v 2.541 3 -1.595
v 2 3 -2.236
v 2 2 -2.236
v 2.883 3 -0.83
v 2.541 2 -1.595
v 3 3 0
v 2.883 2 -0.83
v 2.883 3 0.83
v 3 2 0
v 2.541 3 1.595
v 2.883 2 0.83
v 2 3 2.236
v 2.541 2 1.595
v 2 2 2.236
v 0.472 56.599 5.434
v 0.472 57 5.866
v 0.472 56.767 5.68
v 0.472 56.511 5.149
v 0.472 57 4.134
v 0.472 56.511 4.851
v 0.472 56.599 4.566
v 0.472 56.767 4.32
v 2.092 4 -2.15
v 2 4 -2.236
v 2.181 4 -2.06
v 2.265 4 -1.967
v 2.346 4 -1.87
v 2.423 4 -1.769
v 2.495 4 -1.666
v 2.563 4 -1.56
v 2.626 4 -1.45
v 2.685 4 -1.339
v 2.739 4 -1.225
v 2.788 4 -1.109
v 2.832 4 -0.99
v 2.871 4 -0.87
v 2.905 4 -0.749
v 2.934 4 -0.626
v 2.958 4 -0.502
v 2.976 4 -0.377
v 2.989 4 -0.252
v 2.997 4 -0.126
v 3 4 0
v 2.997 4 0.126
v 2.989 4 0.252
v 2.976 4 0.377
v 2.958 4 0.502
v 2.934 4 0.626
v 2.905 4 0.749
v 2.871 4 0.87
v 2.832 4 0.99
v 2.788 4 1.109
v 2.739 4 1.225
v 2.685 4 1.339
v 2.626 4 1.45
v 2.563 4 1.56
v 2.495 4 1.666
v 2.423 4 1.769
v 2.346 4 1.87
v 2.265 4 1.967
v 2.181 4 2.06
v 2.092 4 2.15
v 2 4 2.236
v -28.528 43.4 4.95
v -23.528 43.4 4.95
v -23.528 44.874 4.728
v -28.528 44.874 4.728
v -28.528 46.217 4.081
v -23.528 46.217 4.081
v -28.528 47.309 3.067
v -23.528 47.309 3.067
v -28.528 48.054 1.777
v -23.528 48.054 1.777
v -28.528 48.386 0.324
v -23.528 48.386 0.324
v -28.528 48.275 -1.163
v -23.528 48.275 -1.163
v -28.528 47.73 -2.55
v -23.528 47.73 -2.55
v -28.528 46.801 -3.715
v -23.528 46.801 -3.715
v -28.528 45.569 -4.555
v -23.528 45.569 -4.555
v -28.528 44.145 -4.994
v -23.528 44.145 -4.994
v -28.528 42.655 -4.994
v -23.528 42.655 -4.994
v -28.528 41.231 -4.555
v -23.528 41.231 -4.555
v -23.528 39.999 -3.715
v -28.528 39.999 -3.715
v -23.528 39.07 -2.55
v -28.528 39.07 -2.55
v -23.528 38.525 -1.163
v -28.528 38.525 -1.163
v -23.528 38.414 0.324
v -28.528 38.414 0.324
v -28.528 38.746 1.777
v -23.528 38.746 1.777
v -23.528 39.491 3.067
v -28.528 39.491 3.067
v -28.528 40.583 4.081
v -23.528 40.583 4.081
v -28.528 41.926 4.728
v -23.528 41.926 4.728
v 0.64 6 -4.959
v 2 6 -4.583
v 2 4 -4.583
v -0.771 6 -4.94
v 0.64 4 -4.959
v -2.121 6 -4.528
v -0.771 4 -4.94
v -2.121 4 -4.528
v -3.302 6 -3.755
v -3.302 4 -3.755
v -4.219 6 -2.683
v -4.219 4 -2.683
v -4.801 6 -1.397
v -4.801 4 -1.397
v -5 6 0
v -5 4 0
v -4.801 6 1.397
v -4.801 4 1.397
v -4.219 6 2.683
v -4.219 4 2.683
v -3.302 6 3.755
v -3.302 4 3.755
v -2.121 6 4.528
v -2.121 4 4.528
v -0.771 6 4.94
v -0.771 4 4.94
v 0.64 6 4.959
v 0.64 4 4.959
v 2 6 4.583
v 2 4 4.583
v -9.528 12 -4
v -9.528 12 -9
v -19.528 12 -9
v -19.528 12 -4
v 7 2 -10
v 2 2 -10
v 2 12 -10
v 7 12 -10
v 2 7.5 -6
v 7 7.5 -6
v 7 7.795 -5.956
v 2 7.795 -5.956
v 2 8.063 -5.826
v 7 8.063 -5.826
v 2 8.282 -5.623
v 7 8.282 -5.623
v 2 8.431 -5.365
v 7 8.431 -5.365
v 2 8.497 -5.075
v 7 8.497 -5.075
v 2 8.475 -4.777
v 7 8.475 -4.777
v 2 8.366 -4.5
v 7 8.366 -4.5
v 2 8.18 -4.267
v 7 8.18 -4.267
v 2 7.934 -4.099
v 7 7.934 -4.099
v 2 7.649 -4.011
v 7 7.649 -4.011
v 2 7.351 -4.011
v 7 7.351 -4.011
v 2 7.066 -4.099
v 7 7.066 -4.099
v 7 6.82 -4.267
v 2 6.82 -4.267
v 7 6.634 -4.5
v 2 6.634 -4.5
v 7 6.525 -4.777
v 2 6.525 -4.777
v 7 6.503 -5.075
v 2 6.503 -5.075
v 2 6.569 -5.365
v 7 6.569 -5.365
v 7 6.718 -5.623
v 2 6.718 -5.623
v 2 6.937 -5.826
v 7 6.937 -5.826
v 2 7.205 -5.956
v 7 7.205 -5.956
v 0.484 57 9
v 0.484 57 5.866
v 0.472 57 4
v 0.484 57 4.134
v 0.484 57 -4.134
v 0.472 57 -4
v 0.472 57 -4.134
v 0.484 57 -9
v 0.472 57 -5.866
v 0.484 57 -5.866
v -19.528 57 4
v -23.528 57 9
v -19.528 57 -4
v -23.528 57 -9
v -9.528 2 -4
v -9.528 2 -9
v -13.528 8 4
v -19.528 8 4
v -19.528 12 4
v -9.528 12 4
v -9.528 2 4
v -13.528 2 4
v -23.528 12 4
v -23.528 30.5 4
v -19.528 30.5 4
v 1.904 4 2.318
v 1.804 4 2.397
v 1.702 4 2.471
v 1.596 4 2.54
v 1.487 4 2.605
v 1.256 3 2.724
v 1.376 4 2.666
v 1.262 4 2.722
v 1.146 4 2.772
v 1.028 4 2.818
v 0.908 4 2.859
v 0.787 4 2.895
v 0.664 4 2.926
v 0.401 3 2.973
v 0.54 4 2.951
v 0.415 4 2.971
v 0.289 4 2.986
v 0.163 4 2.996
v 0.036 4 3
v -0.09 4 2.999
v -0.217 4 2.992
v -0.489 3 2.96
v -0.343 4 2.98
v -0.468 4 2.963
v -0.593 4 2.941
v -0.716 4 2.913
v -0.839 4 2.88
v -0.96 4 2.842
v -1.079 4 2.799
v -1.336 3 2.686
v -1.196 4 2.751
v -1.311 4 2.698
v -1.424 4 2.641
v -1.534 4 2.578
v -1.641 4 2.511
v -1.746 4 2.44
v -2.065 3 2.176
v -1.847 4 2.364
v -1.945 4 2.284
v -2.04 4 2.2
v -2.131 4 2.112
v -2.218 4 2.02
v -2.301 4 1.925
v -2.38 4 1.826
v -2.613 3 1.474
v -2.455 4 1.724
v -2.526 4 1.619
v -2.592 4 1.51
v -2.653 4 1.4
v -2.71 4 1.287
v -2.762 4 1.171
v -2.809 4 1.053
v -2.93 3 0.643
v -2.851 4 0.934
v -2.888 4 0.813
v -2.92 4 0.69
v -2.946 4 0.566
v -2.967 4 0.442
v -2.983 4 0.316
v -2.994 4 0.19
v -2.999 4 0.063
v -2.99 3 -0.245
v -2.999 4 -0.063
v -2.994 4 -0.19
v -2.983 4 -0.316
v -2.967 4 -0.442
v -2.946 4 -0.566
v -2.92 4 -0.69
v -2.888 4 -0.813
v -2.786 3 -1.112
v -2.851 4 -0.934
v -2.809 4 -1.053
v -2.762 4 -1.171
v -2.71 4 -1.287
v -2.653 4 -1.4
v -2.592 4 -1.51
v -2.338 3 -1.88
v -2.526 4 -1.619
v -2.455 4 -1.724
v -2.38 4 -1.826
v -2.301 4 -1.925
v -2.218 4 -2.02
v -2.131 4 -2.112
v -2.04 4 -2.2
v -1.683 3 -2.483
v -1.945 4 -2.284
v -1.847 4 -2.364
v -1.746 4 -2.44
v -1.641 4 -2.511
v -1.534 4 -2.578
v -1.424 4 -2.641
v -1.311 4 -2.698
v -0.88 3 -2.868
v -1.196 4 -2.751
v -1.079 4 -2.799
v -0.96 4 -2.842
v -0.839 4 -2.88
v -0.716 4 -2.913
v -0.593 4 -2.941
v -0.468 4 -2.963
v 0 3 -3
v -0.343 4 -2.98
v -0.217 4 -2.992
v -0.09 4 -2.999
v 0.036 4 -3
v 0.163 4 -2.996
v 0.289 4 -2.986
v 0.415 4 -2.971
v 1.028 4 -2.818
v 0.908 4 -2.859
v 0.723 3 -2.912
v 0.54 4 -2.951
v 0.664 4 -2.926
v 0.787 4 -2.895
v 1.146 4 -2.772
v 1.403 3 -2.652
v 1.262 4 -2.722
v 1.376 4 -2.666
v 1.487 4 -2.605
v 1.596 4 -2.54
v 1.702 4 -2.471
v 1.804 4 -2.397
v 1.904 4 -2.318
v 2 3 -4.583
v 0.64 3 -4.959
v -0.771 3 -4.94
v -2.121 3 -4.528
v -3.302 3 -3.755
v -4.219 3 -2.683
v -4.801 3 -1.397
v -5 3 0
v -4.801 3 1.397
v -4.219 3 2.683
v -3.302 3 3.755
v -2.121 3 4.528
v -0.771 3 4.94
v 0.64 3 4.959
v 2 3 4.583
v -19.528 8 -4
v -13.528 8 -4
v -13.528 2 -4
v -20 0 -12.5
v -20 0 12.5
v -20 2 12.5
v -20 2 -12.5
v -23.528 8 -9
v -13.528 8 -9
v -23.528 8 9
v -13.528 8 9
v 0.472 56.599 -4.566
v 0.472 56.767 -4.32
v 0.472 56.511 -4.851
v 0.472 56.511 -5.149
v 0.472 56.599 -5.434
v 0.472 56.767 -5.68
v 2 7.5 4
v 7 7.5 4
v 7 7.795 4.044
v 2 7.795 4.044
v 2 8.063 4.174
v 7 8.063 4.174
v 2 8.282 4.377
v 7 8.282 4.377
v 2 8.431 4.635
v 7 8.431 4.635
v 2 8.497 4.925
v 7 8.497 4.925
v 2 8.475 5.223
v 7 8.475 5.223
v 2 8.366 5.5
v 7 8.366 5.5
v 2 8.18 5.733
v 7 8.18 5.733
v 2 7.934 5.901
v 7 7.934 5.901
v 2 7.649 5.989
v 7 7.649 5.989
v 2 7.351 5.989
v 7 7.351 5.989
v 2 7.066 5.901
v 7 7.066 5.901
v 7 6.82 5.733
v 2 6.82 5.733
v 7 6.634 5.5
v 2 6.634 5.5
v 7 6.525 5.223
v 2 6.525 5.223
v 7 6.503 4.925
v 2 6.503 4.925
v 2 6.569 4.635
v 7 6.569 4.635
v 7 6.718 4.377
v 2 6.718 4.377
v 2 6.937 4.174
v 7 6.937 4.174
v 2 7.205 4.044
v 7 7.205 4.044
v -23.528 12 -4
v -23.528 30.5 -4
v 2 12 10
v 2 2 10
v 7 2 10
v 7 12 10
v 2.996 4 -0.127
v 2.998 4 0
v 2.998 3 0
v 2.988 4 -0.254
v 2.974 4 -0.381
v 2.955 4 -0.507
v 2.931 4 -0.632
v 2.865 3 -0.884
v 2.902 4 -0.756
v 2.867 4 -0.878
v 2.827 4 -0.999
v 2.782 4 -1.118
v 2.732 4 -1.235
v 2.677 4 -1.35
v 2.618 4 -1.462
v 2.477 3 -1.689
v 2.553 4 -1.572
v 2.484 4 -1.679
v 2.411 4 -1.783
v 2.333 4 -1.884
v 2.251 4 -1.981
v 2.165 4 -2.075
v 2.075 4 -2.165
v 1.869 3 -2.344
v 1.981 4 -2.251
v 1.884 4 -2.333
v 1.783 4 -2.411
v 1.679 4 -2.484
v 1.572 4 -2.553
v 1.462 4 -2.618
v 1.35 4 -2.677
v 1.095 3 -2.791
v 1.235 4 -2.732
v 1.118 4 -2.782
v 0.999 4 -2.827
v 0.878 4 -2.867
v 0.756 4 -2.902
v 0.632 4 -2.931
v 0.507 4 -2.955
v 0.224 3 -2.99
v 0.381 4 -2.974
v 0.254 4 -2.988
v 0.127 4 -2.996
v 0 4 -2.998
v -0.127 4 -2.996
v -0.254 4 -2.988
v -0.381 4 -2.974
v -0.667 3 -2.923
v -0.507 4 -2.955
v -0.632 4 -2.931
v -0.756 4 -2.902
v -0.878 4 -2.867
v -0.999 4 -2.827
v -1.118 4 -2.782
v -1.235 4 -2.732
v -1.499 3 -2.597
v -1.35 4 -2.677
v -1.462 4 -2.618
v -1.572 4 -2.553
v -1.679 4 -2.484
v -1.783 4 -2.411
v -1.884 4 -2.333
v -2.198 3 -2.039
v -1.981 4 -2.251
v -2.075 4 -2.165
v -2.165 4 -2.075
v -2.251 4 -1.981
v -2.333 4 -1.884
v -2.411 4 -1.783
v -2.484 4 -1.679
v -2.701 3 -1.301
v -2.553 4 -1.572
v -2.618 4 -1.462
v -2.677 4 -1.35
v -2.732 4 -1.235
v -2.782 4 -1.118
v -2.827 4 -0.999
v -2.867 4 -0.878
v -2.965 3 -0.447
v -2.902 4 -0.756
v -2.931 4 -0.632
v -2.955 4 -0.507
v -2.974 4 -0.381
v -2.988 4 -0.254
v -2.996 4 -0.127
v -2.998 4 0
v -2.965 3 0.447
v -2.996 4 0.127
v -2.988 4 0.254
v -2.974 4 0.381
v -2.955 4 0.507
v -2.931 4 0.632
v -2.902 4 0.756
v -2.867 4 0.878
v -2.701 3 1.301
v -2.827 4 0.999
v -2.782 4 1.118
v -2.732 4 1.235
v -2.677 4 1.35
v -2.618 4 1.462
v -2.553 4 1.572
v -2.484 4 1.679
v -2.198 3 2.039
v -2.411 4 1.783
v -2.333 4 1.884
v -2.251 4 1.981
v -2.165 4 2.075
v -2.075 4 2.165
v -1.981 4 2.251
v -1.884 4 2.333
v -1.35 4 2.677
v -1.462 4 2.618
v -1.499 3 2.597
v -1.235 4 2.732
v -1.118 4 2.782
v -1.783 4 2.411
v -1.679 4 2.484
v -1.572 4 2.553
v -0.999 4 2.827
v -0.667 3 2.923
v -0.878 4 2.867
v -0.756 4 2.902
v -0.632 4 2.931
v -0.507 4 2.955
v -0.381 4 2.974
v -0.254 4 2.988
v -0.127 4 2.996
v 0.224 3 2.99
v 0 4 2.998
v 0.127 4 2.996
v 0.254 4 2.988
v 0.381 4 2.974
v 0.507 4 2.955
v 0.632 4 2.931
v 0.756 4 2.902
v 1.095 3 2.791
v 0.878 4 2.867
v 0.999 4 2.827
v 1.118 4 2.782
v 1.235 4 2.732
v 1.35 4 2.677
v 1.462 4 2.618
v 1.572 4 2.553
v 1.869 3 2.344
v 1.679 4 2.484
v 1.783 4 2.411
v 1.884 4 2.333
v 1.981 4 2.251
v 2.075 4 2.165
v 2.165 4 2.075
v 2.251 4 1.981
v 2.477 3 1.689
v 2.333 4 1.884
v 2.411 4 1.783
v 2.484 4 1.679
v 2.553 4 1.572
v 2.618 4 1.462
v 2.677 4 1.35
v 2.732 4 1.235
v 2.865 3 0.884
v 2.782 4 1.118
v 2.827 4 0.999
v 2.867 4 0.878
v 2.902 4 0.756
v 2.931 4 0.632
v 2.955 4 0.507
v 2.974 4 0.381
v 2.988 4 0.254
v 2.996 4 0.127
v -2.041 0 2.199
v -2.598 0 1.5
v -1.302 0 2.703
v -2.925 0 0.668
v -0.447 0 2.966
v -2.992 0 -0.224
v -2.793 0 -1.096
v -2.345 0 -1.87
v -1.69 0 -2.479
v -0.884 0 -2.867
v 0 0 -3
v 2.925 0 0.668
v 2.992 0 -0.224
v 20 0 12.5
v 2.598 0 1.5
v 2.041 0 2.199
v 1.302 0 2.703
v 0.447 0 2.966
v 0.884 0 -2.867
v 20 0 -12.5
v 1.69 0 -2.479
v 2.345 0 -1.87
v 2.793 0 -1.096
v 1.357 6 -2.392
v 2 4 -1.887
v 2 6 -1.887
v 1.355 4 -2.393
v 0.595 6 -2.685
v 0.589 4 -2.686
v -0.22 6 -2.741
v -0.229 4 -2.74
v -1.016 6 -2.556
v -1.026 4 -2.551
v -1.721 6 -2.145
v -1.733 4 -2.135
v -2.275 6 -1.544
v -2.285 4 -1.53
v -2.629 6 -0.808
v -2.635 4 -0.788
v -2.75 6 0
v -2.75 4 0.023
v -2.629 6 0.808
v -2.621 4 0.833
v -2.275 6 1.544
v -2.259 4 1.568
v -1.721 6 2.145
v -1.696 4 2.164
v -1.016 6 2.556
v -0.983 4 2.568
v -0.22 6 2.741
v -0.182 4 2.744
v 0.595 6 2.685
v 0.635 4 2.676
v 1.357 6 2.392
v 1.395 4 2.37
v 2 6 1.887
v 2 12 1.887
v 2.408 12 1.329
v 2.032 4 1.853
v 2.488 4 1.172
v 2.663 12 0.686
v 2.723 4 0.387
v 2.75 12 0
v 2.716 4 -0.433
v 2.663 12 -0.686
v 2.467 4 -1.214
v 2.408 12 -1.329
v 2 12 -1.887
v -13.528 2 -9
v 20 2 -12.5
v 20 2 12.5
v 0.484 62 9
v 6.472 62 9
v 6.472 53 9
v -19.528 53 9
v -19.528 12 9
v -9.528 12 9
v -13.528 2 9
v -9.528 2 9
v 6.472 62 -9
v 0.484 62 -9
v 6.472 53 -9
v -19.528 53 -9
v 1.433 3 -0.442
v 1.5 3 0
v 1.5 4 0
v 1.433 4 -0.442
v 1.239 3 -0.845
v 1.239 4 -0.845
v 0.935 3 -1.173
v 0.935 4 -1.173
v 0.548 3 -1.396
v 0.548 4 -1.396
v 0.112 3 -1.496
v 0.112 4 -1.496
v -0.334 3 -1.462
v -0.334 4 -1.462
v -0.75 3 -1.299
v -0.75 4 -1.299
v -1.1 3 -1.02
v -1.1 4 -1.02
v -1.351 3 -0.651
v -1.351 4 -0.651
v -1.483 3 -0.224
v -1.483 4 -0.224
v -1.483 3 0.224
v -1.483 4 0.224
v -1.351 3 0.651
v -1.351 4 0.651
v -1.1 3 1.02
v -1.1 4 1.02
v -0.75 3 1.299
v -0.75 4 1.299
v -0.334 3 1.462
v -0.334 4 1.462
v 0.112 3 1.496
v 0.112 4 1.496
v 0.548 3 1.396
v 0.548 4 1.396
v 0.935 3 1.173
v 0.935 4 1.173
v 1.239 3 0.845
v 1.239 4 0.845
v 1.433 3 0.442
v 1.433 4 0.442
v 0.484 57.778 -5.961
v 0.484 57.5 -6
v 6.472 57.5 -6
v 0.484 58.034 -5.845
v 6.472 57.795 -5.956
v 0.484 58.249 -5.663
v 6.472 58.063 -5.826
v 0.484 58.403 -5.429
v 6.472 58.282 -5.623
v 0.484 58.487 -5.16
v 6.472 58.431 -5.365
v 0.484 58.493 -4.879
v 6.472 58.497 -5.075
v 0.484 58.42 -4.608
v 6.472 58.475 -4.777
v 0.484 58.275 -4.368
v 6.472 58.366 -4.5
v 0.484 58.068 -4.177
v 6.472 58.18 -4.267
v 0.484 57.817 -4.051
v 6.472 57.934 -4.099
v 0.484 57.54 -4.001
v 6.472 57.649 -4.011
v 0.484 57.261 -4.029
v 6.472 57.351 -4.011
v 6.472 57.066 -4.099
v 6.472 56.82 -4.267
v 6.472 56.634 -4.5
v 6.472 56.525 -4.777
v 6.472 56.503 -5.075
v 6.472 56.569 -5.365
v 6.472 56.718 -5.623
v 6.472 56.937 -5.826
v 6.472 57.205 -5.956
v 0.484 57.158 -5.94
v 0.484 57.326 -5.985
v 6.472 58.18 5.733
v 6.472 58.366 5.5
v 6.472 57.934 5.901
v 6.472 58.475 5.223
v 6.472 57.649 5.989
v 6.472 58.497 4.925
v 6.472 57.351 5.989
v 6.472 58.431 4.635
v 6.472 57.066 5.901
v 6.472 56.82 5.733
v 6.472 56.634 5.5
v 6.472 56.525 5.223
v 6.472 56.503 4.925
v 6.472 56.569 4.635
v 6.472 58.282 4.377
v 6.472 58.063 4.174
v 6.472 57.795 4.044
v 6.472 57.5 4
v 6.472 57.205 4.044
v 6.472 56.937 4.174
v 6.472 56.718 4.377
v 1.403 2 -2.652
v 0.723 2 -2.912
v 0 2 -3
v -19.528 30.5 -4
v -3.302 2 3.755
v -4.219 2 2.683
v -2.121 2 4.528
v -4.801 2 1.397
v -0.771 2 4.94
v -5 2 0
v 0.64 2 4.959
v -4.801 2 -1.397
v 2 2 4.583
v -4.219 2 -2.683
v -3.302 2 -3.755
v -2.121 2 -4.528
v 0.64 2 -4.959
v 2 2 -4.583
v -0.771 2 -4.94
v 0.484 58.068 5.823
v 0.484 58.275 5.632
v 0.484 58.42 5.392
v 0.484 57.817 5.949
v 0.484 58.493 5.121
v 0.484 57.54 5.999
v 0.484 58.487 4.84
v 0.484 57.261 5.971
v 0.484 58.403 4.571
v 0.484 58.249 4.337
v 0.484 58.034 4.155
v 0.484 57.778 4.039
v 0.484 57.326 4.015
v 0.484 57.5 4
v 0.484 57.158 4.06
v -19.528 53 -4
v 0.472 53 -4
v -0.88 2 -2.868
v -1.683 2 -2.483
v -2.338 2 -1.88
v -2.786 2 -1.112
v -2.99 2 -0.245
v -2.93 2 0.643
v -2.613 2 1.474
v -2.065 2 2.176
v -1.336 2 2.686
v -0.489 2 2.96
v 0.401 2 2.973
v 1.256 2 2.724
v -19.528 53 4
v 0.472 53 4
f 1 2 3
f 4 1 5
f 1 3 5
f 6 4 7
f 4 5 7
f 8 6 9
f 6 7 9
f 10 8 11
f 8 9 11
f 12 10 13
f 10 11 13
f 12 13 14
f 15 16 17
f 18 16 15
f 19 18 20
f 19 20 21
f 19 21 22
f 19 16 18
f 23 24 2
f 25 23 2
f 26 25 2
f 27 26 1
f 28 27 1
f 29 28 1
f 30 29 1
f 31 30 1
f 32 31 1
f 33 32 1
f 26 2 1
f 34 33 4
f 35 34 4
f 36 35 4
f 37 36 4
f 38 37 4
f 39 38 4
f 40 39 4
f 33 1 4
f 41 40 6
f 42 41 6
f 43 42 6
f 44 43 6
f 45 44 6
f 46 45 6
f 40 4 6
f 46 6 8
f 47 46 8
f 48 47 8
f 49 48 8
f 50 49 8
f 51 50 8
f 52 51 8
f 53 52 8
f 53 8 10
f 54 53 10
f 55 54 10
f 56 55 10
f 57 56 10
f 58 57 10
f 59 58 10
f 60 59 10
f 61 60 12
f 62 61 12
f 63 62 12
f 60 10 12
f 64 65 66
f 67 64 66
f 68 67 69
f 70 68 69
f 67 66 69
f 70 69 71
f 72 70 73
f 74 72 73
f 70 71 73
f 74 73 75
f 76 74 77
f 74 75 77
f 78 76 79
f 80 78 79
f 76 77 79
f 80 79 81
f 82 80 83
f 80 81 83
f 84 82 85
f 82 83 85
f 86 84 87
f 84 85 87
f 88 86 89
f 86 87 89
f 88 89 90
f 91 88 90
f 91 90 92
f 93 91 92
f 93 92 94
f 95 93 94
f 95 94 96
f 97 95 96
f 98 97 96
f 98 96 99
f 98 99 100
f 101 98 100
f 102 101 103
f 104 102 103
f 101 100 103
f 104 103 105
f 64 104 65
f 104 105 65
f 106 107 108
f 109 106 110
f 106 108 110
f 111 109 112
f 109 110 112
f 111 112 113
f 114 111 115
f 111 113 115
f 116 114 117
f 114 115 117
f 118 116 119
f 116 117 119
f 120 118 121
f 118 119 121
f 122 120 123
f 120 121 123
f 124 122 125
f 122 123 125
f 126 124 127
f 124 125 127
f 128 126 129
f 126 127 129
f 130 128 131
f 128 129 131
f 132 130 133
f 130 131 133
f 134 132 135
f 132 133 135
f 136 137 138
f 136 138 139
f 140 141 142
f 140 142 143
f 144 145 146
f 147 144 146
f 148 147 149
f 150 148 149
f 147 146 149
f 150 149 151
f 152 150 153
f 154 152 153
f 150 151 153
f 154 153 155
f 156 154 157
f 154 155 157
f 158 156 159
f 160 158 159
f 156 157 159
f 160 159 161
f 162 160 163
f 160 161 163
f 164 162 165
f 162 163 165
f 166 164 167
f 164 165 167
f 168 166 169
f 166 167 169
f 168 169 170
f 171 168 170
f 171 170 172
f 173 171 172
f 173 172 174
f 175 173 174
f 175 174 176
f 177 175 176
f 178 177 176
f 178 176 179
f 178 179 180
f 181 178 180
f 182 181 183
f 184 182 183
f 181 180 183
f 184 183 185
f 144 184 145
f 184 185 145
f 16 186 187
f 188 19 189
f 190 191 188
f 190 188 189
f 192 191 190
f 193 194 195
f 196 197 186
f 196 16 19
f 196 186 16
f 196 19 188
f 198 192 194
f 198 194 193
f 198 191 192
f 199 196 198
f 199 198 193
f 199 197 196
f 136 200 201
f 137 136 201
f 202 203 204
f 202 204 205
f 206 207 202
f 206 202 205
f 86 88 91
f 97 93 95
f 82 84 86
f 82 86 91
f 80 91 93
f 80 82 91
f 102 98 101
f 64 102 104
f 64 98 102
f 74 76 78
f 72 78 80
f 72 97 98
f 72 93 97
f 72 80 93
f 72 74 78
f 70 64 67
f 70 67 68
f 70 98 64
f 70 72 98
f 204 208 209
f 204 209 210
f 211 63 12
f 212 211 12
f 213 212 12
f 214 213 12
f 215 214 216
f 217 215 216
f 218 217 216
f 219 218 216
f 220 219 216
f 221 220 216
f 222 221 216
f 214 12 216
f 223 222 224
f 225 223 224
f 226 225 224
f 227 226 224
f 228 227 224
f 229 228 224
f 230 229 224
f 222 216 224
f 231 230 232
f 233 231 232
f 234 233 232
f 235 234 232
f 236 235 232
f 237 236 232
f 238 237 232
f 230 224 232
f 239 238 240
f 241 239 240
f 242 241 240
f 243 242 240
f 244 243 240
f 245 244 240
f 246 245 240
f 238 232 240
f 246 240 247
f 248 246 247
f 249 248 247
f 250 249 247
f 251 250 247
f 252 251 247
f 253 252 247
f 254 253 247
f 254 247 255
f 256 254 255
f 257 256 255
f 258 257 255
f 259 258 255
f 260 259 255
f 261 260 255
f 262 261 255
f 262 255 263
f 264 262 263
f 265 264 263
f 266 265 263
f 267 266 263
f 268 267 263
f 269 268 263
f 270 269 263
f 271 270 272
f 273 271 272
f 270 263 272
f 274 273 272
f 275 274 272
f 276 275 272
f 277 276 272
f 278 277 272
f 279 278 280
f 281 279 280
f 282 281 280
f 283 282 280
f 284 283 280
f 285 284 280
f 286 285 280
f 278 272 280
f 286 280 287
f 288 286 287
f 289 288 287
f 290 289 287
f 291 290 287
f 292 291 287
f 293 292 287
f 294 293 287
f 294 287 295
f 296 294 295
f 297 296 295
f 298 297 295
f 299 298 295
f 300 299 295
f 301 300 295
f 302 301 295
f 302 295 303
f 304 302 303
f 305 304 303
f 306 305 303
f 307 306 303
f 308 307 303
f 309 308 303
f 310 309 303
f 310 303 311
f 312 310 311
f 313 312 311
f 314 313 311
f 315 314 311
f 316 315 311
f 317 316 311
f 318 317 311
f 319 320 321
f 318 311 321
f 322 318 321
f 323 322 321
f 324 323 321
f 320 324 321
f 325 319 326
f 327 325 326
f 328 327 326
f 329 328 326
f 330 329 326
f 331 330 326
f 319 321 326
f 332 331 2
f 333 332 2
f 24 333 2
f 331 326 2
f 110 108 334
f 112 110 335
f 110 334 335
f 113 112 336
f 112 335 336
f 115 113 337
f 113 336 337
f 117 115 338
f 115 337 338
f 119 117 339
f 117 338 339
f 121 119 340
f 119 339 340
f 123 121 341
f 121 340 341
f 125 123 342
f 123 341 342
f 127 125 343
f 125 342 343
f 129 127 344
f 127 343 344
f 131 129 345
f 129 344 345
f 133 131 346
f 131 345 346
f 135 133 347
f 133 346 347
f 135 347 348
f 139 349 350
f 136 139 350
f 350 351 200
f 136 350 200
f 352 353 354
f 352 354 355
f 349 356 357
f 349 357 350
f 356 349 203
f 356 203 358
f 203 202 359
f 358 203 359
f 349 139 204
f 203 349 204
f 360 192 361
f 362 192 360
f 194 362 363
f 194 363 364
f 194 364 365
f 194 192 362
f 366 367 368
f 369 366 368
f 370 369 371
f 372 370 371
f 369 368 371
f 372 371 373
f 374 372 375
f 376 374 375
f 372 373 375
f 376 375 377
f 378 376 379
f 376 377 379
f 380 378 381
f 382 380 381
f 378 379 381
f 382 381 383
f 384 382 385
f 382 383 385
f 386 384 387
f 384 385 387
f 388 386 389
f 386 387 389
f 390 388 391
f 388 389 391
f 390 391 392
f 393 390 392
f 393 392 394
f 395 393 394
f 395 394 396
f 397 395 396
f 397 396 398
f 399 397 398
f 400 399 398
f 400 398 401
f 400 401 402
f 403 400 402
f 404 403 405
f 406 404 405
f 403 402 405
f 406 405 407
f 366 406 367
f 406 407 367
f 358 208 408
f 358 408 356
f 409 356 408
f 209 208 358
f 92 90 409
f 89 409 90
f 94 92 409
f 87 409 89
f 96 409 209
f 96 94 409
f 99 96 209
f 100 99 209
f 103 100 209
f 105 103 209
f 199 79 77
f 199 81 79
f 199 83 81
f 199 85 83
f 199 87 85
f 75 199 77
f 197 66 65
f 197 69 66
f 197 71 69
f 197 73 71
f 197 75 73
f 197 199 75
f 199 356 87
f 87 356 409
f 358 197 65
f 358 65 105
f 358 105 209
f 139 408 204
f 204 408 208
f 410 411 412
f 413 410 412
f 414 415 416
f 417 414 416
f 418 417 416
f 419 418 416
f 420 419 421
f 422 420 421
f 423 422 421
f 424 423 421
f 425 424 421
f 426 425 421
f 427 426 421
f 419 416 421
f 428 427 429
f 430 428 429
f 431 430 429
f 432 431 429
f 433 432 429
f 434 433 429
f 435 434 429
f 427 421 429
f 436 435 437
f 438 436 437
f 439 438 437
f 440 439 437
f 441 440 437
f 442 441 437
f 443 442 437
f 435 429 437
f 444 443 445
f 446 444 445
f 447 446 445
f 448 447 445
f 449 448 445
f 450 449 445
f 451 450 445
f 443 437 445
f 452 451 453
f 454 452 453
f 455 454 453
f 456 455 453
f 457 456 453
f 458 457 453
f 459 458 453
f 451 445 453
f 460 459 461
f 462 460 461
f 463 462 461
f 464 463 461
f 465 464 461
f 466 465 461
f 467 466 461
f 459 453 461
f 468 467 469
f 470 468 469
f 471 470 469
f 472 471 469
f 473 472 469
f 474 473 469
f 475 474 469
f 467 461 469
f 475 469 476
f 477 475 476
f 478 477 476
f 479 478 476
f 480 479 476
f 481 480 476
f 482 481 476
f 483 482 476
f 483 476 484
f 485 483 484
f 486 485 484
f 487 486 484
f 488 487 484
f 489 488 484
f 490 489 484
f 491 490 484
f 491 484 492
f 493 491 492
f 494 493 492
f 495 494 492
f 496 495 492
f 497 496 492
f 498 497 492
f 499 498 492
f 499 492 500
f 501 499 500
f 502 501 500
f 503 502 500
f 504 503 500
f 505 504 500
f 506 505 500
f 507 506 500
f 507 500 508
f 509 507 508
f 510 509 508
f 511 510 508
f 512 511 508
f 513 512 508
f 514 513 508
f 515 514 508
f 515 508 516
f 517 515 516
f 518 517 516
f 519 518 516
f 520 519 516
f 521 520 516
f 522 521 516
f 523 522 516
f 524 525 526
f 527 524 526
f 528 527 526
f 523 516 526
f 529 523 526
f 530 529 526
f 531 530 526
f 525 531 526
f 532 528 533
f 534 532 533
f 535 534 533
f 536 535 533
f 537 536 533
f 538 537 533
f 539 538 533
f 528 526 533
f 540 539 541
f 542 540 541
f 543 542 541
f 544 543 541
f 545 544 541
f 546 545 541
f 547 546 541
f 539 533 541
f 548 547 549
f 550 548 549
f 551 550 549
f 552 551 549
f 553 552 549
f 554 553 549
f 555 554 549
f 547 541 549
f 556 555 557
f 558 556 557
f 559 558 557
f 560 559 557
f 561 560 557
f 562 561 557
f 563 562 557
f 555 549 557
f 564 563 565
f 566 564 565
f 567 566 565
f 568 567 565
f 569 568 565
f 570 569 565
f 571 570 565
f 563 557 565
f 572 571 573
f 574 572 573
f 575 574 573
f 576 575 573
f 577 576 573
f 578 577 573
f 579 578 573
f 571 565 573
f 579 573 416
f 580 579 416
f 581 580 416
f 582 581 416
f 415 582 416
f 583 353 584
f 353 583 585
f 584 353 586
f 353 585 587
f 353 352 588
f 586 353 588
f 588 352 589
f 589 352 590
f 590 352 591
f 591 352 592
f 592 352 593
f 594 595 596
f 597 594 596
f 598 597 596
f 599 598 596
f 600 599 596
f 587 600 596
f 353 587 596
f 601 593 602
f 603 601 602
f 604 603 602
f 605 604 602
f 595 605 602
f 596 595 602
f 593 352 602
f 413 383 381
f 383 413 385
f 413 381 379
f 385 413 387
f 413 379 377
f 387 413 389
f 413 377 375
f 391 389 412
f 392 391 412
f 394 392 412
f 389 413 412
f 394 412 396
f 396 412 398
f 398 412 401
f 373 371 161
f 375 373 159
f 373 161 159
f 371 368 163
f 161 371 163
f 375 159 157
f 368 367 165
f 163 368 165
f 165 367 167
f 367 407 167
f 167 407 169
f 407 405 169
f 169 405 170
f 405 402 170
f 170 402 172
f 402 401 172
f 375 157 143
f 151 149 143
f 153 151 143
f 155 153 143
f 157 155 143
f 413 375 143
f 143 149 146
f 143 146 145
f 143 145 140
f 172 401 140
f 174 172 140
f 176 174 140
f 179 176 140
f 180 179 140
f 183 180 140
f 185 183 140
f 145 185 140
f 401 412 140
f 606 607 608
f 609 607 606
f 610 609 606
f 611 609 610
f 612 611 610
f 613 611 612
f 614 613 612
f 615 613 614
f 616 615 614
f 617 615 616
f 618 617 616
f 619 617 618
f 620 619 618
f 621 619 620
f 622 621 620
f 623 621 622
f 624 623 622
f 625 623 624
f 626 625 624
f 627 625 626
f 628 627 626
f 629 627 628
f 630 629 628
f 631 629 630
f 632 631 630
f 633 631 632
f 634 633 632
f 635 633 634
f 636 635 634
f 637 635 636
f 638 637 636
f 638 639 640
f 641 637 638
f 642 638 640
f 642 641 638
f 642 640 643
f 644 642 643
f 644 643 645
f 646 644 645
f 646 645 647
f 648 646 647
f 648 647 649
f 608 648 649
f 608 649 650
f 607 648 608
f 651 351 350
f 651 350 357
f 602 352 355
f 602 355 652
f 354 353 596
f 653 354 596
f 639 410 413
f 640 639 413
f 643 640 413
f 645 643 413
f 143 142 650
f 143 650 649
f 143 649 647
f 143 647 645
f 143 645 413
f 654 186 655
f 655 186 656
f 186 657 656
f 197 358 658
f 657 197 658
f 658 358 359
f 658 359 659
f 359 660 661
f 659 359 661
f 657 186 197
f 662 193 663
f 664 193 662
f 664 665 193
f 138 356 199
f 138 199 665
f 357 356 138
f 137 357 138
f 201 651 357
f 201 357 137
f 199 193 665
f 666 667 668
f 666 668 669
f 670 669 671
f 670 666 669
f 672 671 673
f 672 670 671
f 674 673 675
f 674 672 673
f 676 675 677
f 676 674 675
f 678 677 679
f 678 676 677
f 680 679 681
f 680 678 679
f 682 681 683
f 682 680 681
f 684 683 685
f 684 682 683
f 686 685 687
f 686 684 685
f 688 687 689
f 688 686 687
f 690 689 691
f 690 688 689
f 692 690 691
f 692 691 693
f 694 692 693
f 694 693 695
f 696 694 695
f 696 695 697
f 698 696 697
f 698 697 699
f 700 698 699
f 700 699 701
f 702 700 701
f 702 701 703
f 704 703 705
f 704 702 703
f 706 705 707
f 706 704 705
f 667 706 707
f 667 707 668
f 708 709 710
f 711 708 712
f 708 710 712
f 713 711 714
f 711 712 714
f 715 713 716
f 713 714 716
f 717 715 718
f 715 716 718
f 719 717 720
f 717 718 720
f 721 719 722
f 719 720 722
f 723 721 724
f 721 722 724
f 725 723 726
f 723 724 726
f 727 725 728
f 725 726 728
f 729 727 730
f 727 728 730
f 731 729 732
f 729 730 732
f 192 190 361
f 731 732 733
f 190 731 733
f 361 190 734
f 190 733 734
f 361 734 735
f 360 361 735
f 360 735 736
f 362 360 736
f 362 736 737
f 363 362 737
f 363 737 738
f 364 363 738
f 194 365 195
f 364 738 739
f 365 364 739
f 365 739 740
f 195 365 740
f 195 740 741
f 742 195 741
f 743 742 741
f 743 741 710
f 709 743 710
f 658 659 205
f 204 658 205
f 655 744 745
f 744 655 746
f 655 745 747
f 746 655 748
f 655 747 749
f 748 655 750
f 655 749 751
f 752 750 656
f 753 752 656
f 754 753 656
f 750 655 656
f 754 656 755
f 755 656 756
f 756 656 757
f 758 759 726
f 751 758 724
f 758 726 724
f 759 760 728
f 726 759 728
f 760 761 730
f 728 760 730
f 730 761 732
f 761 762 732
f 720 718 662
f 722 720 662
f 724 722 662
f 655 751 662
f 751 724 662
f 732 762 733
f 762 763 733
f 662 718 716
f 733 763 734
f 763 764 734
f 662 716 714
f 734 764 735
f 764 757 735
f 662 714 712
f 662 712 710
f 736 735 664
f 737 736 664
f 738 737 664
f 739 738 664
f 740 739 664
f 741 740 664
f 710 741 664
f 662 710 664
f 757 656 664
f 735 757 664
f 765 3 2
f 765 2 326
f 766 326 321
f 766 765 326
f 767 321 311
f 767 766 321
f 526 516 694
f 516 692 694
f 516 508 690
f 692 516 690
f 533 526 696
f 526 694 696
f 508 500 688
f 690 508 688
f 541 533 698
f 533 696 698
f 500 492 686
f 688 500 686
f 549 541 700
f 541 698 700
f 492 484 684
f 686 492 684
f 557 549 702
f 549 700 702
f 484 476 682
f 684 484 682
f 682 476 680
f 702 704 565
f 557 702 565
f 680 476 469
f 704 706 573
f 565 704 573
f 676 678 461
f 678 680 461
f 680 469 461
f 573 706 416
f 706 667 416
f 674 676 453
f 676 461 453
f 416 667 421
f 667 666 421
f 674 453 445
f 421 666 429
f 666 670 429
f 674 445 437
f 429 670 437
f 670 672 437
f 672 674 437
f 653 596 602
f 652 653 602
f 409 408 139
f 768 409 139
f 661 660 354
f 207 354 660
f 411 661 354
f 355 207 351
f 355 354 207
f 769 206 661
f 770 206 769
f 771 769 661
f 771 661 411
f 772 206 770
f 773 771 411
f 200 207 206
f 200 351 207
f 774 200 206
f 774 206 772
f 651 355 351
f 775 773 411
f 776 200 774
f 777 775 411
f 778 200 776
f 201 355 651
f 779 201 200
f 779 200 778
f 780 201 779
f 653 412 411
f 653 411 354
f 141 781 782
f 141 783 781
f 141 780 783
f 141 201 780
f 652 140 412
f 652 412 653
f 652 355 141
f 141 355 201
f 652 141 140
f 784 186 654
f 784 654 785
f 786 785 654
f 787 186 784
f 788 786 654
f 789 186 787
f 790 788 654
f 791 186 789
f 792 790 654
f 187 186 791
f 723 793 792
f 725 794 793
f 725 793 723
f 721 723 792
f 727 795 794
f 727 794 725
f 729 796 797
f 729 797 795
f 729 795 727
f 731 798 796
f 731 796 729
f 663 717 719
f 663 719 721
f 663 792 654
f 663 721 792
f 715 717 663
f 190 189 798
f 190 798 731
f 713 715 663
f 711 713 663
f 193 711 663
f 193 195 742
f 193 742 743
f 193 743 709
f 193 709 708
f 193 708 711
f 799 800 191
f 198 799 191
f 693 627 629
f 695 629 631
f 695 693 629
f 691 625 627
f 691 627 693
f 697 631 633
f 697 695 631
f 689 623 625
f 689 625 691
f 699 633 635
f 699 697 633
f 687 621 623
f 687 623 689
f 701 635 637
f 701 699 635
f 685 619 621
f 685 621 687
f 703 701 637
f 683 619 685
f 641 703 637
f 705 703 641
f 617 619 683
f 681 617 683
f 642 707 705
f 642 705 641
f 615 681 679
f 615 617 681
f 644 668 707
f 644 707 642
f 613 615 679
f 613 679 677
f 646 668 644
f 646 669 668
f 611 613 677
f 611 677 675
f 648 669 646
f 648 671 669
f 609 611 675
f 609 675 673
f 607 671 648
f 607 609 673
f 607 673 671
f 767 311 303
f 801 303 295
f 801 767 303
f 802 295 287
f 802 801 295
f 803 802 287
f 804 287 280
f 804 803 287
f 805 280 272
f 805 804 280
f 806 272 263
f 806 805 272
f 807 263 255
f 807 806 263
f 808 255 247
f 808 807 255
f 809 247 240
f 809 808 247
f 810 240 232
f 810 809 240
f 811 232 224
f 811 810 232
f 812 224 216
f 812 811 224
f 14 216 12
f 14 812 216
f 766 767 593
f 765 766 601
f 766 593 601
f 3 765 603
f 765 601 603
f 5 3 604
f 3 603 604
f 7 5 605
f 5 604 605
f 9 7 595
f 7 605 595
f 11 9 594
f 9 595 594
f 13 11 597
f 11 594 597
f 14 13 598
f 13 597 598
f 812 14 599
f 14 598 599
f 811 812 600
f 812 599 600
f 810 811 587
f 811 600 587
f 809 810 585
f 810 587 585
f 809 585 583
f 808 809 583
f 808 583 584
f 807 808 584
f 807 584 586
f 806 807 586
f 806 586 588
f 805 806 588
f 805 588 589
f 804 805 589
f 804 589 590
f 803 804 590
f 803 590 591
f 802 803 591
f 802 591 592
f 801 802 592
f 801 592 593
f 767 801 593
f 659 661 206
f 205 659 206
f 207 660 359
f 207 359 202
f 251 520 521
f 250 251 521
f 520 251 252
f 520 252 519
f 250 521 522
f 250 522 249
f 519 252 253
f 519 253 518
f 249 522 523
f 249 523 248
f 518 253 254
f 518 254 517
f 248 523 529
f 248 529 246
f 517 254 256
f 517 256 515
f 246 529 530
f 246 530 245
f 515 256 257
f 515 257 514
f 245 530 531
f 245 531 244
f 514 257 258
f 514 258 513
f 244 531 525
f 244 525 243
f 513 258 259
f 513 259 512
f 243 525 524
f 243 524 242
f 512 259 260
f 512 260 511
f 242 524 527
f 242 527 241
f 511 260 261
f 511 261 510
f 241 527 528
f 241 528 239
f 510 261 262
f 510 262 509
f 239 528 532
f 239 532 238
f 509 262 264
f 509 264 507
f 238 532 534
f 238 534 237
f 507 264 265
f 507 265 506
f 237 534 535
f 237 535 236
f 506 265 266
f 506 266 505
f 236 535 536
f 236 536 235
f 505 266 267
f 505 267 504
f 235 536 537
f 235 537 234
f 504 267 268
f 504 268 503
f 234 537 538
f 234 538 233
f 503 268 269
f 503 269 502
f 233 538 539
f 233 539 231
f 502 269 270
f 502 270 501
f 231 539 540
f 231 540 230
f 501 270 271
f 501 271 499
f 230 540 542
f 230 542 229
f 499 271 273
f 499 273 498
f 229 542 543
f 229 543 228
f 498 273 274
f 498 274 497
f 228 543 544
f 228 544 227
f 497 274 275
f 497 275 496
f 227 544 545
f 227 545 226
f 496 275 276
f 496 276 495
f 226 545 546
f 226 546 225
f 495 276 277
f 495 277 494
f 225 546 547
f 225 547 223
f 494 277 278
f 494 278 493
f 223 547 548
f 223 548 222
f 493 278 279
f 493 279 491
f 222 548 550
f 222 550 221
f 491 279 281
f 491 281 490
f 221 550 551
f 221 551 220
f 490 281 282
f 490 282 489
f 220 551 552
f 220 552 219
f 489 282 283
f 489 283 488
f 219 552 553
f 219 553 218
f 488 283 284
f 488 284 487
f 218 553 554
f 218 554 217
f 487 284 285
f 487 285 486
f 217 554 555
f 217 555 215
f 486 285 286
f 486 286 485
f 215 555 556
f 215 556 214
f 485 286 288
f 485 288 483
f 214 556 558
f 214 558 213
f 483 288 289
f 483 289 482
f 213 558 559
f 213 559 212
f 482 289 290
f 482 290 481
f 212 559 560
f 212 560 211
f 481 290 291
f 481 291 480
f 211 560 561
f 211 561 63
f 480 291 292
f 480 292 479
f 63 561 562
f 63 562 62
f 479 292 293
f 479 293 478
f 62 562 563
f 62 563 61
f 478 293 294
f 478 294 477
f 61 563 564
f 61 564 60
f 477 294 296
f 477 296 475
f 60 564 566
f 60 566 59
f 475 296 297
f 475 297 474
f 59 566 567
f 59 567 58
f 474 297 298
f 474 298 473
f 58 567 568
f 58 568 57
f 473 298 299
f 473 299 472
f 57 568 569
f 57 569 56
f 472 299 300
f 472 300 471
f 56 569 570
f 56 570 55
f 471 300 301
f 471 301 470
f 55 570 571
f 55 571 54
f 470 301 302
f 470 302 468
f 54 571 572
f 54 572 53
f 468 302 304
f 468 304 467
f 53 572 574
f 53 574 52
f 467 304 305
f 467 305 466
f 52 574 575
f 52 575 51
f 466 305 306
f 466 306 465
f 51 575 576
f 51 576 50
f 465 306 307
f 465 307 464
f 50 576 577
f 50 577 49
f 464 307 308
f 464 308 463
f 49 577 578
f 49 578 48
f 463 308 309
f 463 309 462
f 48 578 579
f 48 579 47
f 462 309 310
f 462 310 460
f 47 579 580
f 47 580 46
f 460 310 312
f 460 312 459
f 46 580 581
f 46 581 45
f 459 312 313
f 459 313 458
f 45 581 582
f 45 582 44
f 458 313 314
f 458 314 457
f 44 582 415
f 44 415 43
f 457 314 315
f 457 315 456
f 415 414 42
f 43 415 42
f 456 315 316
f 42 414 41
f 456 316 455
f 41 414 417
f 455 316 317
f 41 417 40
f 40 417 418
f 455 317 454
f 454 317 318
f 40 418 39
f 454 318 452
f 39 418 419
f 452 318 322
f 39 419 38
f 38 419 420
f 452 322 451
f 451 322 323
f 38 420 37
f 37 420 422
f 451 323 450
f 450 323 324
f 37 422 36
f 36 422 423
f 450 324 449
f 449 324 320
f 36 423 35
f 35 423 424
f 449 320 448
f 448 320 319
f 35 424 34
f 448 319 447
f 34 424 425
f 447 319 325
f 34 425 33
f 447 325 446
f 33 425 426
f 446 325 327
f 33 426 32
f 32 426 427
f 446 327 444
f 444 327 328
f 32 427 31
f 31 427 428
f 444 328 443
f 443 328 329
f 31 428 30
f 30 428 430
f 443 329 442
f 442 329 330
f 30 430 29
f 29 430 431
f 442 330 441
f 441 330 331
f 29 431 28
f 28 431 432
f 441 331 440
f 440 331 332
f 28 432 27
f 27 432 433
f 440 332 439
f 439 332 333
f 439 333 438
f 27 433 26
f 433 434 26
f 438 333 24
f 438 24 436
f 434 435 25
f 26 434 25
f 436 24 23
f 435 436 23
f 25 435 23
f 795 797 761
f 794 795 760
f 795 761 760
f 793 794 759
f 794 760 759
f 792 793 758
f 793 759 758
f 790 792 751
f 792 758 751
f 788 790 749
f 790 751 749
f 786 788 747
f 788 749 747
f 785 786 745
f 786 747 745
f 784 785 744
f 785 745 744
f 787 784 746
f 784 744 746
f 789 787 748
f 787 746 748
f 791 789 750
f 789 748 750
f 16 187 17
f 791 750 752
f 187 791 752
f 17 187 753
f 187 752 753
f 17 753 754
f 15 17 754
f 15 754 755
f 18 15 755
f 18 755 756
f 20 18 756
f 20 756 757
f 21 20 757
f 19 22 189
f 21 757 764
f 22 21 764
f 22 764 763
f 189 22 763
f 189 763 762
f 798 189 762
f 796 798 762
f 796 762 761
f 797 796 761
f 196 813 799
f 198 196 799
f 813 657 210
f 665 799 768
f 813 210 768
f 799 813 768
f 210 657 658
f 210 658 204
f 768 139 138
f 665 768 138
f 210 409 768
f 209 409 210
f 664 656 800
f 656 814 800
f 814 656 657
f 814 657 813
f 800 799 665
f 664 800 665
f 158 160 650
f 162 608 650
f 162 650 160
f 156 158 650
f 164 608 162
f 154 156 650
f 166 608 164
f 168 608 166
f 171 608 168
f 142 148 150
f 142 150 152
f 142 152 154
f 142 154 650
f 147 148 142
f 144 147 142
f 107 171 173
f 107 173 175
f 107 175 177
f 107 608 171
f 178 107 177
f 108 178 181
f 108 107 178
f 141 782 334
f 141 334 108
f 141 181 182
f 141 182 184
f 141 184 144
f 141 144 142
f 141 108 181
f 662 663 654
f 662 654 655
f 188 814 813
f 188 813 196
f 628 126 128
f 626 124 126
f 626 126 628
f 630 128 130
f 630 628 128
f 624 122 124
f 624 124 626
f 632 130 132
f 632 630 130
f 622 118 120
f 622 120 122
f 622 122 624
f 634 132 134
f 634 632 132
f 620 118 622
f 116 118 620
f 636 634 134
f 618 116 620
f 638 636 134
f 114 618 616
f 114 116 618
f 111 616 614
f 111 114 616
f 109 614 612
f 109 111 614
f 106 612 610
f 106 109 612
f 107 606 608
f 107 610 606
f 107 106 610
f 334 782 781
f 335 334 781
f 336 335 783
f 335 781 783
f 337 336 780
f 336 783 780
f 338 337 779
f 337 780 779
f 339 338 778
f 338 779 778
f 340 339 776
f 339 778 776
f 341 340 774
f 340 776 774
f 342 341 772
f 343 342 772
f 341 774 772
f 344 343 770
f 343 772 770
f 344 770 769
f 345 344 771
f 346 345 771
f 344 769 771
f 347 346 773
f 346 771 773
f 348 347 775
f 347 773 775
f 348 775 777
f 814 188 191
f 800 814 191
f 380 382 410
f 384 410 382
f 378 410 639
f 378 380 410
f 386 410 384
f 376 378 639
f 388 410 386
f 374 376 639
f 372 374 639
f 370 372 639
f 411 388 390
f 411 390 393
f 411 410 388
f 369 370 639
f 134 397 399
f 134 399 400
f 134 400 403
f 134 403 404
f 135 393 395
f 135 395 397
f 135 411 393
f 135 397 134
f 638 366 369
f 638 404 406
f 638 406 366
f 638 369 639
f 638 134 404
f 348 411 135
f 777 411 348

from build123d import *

# Parameters (mm, degrees)
SKETCH1_W                  = 40
SKETCH1_H                  = 25
BOSS_EXTRUDE1_DEPTH        = 2
SKETCH2_W                  = 5
SKETCH2_H                  = 20
BOSS_EXTRUDE2_DEPTH        = 10
SKETCH4_W                  = 19.965035534
SKETCH4_H                  = 6
BOSS_EXTRUDE3_DEPTH        = 5
SKETCH5_R                  = 1
CUT_EXTRUDE2_DEPTH         = 5
SKETCH6_W                  = 4
SKETCH6_H                  = 5
BOSS_EXTRUDE4_DEPTH        = 10
SKETCH8_W                  = 5
SKETCH8_H                  = 4
BOSS_EXTRUDE5_DEPTH        = 10
SKETCH9_W                  = 4
SKETCH9_H                  = 5
BOSS_EXTRUDE6_DEPTH        = 45
SKETCH12_W                 = 18
SKETCH12_H                 = 4
BOSS_EXTRUDE8_DEPTH        = 4
SKETCH13_W                 = 5
SKETCH13_H                 = 4
BOSS_EXTRUDE9_DEPTH        = 26
SKETCH14_W                 = 18
SKETCH14_H                 = 4
BOSS_EXTRUDE10_DEPTH       = 6
SKETCH16_W                 = 5.988277512
SKETCH16_H                 = 18
BOSS_EXTRUDE11_DEPTH       = 5
SKETCH15_R                 = 1
CUT_EXTRUDE3_DEPTH         = 6
SKETCH17_R                 = 3
CUT_EXTRUDE5_DEPTH         = 6
SKETCH24_W                 = 8
SKETCH24_H                 = 18.5
BOSS_EXTRUDE18_DEPTH       = 4
BOSS_EXTRUDE20_START       = -1
SKETCH20_R                 = 5
SKETCH20_R_2               = 3
BOSS_EXTRUDE20_DEPTH       = 1
BOSS_EXTRUDE21_OUTLINE_R   = 2.998308623
BOSS_EXTRUDE21_OUTLINE_R_2 = 1.5
BOSS_EXTRUDE21_DEPTH       = 1
SKETCH27_R                 = 5
SKETCH27_R_2               = 2.75
BOSS_EXTRUDE22_DEPTH       = 2
SKETCH28_R                 = 2.75
CUT_EXTRUDE10_DEPTH        = 10
SKETCH29_R                 = 5
BOSS_EXTRUDE23_DEPTH       = 5


# Read off the part's stored shape, not the designer's step: Boss-Extrude21
with BuildPart() as part:
    # Sketch1 → Boss-Extrude1 (new body)
    with BuildSketch(Plane(origin=(0, 0, 0), x_dir=(1, 0, 0), z_dir=(0, 1, 0))):
        Rectangle(SKETCH1_W, SKETCH1_H)
    extrude(amount=BOSS_EXTRUDE1_DEPTH)

    # Sketch2 → Boss-Extrude2 (add)
    with BuildSketch(Plane(origin=(0, 2, 0), x_dir=(1, 0, 0), z_dir=(0, 1, 0))):
        with Locations((4.5, 0)):
            Rectangle(SKETCH2_W, SKETCH2_H)
    extrude(amount=BOSS_EXTRUDE2_DEPTH)

    # Sketch4 → Boss-Extrude3 (add)
    with BuildSketch(Plane(origin=(7, 0, 0), x_dir=(0, 0, -1), z_dir=(1, 0, 0))):
        with Locations((-0.017482233, 9)):
            Rectangle(SKETCH4_W, SKETCH4_H)
    extrude(amount=-BOSS_EXTRUDE3_DEPTH)

    # Sketch5 → Cut-Extrude2 (cut)
    with BuildSketch(Plane(origin=(7, 0, 0), x_dir=(0, 0, -1), z_dir=(1, 0, 0))):
        with Locations((5, 7.5)):
            Circle(SKETCH5_R)
        with Locations((-5, 7.5)):
            Circle(SKETCH5_R)
    extrude(amount=-CUT_EXTRUDE2_DEPTH, mode=Mode.SUBTRACT)

    # Sketch6 → Boss-Extrude4 (add)
    with BuildSketch(Plane(origin=(0, 2, 0), x_dir=(1, 0, 0), z_dir=(0, 1, 0))):
        with Locations((-11.527661753, -6.5)):
            Rectangle(SKETCH6_W, SKETCH6_H)
        with Locations((-11.527661753, 6.5)):
            Rectangle(SKETCH6_W, SKETCH6_H)
    extrude(amount=BOSS_EXTRUDE4_DEPTH)

    # Sketch8 → Boss-Extrude5 (add)
    with BuildSketch(Plane.ZY.offset(13.527661753)):
        with Locations((-6.5, 10)):
            Rectangle(SKETCH8_W, SKETCH8_H)
    boss_extrude5 = extrude(amount=BOSS_EXTRUDE5_DEPTH)

    # Mirror1: Boss-Extrude5 across plane
    add(boss_extrude5.mirror(Plane(origin=(0, 0, 0), x_dir=(1, 0, 0), z_dir=(0, 0, -1))))

    # Sketch9 → Boss-Extrude6 (add)
    with BuildSketch(Plane(origin=(0, 12, 0), x_dir=(1, 0, 0), z_dir=(0, 1, 0))):
        with Locations((-21.527661753, 6.5)):
            Rectangle(SKETCH9_W, SKETCH9_H)
    boss_extrude6 = extrude(amount=BOSS_EXTRUDE6_DEPTH)

    # Mirror2: Boss-Extrude5 across plane
    add(boss_extrude5.mirror(Plane(origin=(0, 0, 0), x_dir=(1, 0, 0), z_dir=(0, 0, -1))))

    # Mirror3: Boss-Extrude6 across plane
    add(boss_extrude6.mirror(Plane(origin=(0, 0, 0), x_dir=(1, 0, 0), z_dir=(0, 0, -1))))

    # Sketch12 → Boss-Extrude8 (add)
    with BuildSketch(Plane.ZY.offset(23.527661753)):
        with Locations((0, 55)):
            Rectangle(SKETCH12_W, SKETCH12_H)
        with Locations((0, 10)):
            Rectangle(SKETCH12_W, SKETCH12_H)
        with Locations((0, 32.5)):
            Rectangle(SKETCH12_W, SKETCH12_H)
    extrude(amount=-BOSS_EXTRUDE8_DEPTH)

    # Sketch13 → Boss-Extrude9 (add)
    with BuildSketch(Plane(origin=(-19.527661753, 0, 0), x_dir=(0, 0, -1), z_dir=(1, 0, 0))):
        with Locations((-6.5, 55)):
            Rectangle(SKETCH13_W, SKETCH13_H)
        with Locations((6.5, 55)):
            Rectangle(SKETCH13_W, SKETCH13_H)
    extrude(amount=BOSS_EXTRUDE9_DEPTH)

    # Sketch14 → Boss-Extrude10 (add)
    with BuildSketch(Plane(origin=(6.472338247, 0, 0), x_dir=(0, 0, -1), z_dir=(1, 0, 0))):
        with Locations((0, 55)):
            Rectangle(SKETCH14_W, SKETCH14_H)
    extrude(amount=-BOSS_EXTRUDE10_DEPTH)

    # Sketch16 → Boss-Extrude11 (add)
    with BuildSketch(Plane(origin=(0, 57, 0), x_dir=(1, 0, 0), z_dir=(0, 1, 0))):
        with Locations((3.478199491, 0)):
            Rectangle(SKETCH16_W, SKETCH16_H)
    extrude(amount=BOSS_EXTRUDE11_DEPTH)

    # Sketch15 → Cut-Extrude3 (cut)
    with BuildSketch(Plane(origin=(6.472338247, 0, 0), x_dir=(0, 0, -1), z_dir=(1, 0, 0))):
        with Locations((-5, 57.5)):
            Circle(SKETCH15_R)
        with Locations((5, 57.5)):
            Circle(SKETCH15_R)
    extrude(amount=-CUT_EXTRUDE3_DEPTH, mode=Mode.SUBTRACT)

    # Sketch17 → Cut-Extrude5 (cut)
    with BuildSketch(Plane.XZ):
        with Locations(Location((0, 0, 0), (0, 0, 270))):
            Circle(SKETCH17_R)
    extrude(amount=-CUT_EXTRUDE5_DEPTH, mode=Mode.SUBTRACT)

    # Sketch24 → Boss-Extrude18 (add)
    with BuildSketch(Plane.ZY.offset(23.527661753)):
        with Locations((0, 43.75)):
            Rectangle(SKETCH24_W, SKETCH24_H)
    extrude(amount=-BOSS_EXTRUDE18_DEPTH)

    # Sketch20 → Boss-Extrude20 (add)
    with BuildSketch(Plane(origin=(0, 3, 0), x_dir=(1, 0, 0), z_dir=(0, 1, 0)).offset(BOSS_EXTRUDE20_START)):
        Circle(SKETCH20_R)
        with Locations(Location((0, 0, 0), (0, 0, 90))):
            Circle(SKETCH20_R_2, mode=Mode.SUBTRACT)
    extrude(amount=BOSS_EXTRUDE20_DEPTH)

    # Boss-Extrude21 outline → Boss-Extrude21 (add)
    # profile 1 of 2: a face of its own
    with BuildSketch(Plane(origin=(0, 3, 0), x_dir=(1, 0, 0), z_dir=(0, 1, 0))):
        with BuildLine():
            ThreePointArc((2, -2.236067977), (-3, 0), (2, 2.236067977))
            Line((2, 2.236067977), (2, 4.582575695))
            ThreePointArc((2, 4.582575695), (-5, 0), (2, -4.582575695))
            Line((2, -4.582575695), (2, -2.236067977))
        make_face()
    # profile 2 of 2: a face of its own
    with BuildSketch(Plane(origin=(0, 3, 0), x_dir=(1, 0, 0), z_dir=(0, 1, 0))):
        Circle(BOSS_EXTRUDE21_OUTLINE_R)
        Circle(BOSS_EXTRUDE21_OUTLINE_R_2, mode=Mode.SUBTRACT)
    extrude(amount=BOSS_EXTRUDE21_DEPTH)

    # Sketch27 → Boss-Extrude22 (add)
    with BuildSketch(Plane(origin=(0, 4, 0), x_dir=(1, 0, 0), z_dir=(0, 1, 0))):
        Circle(SKETCH27_R)
        with Locations(Location((0, 0, 0), (0, 0, 43.341758227))):
            Circle(SKETCH27_R_2, mode=Mode.SUBTRACT)
    extrude(amount=BOSS_EXTRUDE22_DEPTH)

    # Sketch28 → Cut-Extrude10 (cut)
    with BuildSketch(Plane(origin=(0, 6, 0), x_dir=(1, 0, 0), z_dir=(0, 1, 0))):
        with Locations(Location((0, 0, 0), (0, 0, 43.341758227))):
            Circle(SKETCH28_R)
    extrude(amount=CUT_EXTRUDE10_DEPTH, mode=Mode.SUBTRACT)

    # Sketch29 → Boss-Extrude23 (add)
    with BuildSketch(Plane.ZY.offset(23.527661753)):
        with Locations((-0.05, 43.4)):
            Circle(SKETCH29_R)
    extrude(amount=BOSS_EXTRUDE23_DEPTH)


solid = part.part
